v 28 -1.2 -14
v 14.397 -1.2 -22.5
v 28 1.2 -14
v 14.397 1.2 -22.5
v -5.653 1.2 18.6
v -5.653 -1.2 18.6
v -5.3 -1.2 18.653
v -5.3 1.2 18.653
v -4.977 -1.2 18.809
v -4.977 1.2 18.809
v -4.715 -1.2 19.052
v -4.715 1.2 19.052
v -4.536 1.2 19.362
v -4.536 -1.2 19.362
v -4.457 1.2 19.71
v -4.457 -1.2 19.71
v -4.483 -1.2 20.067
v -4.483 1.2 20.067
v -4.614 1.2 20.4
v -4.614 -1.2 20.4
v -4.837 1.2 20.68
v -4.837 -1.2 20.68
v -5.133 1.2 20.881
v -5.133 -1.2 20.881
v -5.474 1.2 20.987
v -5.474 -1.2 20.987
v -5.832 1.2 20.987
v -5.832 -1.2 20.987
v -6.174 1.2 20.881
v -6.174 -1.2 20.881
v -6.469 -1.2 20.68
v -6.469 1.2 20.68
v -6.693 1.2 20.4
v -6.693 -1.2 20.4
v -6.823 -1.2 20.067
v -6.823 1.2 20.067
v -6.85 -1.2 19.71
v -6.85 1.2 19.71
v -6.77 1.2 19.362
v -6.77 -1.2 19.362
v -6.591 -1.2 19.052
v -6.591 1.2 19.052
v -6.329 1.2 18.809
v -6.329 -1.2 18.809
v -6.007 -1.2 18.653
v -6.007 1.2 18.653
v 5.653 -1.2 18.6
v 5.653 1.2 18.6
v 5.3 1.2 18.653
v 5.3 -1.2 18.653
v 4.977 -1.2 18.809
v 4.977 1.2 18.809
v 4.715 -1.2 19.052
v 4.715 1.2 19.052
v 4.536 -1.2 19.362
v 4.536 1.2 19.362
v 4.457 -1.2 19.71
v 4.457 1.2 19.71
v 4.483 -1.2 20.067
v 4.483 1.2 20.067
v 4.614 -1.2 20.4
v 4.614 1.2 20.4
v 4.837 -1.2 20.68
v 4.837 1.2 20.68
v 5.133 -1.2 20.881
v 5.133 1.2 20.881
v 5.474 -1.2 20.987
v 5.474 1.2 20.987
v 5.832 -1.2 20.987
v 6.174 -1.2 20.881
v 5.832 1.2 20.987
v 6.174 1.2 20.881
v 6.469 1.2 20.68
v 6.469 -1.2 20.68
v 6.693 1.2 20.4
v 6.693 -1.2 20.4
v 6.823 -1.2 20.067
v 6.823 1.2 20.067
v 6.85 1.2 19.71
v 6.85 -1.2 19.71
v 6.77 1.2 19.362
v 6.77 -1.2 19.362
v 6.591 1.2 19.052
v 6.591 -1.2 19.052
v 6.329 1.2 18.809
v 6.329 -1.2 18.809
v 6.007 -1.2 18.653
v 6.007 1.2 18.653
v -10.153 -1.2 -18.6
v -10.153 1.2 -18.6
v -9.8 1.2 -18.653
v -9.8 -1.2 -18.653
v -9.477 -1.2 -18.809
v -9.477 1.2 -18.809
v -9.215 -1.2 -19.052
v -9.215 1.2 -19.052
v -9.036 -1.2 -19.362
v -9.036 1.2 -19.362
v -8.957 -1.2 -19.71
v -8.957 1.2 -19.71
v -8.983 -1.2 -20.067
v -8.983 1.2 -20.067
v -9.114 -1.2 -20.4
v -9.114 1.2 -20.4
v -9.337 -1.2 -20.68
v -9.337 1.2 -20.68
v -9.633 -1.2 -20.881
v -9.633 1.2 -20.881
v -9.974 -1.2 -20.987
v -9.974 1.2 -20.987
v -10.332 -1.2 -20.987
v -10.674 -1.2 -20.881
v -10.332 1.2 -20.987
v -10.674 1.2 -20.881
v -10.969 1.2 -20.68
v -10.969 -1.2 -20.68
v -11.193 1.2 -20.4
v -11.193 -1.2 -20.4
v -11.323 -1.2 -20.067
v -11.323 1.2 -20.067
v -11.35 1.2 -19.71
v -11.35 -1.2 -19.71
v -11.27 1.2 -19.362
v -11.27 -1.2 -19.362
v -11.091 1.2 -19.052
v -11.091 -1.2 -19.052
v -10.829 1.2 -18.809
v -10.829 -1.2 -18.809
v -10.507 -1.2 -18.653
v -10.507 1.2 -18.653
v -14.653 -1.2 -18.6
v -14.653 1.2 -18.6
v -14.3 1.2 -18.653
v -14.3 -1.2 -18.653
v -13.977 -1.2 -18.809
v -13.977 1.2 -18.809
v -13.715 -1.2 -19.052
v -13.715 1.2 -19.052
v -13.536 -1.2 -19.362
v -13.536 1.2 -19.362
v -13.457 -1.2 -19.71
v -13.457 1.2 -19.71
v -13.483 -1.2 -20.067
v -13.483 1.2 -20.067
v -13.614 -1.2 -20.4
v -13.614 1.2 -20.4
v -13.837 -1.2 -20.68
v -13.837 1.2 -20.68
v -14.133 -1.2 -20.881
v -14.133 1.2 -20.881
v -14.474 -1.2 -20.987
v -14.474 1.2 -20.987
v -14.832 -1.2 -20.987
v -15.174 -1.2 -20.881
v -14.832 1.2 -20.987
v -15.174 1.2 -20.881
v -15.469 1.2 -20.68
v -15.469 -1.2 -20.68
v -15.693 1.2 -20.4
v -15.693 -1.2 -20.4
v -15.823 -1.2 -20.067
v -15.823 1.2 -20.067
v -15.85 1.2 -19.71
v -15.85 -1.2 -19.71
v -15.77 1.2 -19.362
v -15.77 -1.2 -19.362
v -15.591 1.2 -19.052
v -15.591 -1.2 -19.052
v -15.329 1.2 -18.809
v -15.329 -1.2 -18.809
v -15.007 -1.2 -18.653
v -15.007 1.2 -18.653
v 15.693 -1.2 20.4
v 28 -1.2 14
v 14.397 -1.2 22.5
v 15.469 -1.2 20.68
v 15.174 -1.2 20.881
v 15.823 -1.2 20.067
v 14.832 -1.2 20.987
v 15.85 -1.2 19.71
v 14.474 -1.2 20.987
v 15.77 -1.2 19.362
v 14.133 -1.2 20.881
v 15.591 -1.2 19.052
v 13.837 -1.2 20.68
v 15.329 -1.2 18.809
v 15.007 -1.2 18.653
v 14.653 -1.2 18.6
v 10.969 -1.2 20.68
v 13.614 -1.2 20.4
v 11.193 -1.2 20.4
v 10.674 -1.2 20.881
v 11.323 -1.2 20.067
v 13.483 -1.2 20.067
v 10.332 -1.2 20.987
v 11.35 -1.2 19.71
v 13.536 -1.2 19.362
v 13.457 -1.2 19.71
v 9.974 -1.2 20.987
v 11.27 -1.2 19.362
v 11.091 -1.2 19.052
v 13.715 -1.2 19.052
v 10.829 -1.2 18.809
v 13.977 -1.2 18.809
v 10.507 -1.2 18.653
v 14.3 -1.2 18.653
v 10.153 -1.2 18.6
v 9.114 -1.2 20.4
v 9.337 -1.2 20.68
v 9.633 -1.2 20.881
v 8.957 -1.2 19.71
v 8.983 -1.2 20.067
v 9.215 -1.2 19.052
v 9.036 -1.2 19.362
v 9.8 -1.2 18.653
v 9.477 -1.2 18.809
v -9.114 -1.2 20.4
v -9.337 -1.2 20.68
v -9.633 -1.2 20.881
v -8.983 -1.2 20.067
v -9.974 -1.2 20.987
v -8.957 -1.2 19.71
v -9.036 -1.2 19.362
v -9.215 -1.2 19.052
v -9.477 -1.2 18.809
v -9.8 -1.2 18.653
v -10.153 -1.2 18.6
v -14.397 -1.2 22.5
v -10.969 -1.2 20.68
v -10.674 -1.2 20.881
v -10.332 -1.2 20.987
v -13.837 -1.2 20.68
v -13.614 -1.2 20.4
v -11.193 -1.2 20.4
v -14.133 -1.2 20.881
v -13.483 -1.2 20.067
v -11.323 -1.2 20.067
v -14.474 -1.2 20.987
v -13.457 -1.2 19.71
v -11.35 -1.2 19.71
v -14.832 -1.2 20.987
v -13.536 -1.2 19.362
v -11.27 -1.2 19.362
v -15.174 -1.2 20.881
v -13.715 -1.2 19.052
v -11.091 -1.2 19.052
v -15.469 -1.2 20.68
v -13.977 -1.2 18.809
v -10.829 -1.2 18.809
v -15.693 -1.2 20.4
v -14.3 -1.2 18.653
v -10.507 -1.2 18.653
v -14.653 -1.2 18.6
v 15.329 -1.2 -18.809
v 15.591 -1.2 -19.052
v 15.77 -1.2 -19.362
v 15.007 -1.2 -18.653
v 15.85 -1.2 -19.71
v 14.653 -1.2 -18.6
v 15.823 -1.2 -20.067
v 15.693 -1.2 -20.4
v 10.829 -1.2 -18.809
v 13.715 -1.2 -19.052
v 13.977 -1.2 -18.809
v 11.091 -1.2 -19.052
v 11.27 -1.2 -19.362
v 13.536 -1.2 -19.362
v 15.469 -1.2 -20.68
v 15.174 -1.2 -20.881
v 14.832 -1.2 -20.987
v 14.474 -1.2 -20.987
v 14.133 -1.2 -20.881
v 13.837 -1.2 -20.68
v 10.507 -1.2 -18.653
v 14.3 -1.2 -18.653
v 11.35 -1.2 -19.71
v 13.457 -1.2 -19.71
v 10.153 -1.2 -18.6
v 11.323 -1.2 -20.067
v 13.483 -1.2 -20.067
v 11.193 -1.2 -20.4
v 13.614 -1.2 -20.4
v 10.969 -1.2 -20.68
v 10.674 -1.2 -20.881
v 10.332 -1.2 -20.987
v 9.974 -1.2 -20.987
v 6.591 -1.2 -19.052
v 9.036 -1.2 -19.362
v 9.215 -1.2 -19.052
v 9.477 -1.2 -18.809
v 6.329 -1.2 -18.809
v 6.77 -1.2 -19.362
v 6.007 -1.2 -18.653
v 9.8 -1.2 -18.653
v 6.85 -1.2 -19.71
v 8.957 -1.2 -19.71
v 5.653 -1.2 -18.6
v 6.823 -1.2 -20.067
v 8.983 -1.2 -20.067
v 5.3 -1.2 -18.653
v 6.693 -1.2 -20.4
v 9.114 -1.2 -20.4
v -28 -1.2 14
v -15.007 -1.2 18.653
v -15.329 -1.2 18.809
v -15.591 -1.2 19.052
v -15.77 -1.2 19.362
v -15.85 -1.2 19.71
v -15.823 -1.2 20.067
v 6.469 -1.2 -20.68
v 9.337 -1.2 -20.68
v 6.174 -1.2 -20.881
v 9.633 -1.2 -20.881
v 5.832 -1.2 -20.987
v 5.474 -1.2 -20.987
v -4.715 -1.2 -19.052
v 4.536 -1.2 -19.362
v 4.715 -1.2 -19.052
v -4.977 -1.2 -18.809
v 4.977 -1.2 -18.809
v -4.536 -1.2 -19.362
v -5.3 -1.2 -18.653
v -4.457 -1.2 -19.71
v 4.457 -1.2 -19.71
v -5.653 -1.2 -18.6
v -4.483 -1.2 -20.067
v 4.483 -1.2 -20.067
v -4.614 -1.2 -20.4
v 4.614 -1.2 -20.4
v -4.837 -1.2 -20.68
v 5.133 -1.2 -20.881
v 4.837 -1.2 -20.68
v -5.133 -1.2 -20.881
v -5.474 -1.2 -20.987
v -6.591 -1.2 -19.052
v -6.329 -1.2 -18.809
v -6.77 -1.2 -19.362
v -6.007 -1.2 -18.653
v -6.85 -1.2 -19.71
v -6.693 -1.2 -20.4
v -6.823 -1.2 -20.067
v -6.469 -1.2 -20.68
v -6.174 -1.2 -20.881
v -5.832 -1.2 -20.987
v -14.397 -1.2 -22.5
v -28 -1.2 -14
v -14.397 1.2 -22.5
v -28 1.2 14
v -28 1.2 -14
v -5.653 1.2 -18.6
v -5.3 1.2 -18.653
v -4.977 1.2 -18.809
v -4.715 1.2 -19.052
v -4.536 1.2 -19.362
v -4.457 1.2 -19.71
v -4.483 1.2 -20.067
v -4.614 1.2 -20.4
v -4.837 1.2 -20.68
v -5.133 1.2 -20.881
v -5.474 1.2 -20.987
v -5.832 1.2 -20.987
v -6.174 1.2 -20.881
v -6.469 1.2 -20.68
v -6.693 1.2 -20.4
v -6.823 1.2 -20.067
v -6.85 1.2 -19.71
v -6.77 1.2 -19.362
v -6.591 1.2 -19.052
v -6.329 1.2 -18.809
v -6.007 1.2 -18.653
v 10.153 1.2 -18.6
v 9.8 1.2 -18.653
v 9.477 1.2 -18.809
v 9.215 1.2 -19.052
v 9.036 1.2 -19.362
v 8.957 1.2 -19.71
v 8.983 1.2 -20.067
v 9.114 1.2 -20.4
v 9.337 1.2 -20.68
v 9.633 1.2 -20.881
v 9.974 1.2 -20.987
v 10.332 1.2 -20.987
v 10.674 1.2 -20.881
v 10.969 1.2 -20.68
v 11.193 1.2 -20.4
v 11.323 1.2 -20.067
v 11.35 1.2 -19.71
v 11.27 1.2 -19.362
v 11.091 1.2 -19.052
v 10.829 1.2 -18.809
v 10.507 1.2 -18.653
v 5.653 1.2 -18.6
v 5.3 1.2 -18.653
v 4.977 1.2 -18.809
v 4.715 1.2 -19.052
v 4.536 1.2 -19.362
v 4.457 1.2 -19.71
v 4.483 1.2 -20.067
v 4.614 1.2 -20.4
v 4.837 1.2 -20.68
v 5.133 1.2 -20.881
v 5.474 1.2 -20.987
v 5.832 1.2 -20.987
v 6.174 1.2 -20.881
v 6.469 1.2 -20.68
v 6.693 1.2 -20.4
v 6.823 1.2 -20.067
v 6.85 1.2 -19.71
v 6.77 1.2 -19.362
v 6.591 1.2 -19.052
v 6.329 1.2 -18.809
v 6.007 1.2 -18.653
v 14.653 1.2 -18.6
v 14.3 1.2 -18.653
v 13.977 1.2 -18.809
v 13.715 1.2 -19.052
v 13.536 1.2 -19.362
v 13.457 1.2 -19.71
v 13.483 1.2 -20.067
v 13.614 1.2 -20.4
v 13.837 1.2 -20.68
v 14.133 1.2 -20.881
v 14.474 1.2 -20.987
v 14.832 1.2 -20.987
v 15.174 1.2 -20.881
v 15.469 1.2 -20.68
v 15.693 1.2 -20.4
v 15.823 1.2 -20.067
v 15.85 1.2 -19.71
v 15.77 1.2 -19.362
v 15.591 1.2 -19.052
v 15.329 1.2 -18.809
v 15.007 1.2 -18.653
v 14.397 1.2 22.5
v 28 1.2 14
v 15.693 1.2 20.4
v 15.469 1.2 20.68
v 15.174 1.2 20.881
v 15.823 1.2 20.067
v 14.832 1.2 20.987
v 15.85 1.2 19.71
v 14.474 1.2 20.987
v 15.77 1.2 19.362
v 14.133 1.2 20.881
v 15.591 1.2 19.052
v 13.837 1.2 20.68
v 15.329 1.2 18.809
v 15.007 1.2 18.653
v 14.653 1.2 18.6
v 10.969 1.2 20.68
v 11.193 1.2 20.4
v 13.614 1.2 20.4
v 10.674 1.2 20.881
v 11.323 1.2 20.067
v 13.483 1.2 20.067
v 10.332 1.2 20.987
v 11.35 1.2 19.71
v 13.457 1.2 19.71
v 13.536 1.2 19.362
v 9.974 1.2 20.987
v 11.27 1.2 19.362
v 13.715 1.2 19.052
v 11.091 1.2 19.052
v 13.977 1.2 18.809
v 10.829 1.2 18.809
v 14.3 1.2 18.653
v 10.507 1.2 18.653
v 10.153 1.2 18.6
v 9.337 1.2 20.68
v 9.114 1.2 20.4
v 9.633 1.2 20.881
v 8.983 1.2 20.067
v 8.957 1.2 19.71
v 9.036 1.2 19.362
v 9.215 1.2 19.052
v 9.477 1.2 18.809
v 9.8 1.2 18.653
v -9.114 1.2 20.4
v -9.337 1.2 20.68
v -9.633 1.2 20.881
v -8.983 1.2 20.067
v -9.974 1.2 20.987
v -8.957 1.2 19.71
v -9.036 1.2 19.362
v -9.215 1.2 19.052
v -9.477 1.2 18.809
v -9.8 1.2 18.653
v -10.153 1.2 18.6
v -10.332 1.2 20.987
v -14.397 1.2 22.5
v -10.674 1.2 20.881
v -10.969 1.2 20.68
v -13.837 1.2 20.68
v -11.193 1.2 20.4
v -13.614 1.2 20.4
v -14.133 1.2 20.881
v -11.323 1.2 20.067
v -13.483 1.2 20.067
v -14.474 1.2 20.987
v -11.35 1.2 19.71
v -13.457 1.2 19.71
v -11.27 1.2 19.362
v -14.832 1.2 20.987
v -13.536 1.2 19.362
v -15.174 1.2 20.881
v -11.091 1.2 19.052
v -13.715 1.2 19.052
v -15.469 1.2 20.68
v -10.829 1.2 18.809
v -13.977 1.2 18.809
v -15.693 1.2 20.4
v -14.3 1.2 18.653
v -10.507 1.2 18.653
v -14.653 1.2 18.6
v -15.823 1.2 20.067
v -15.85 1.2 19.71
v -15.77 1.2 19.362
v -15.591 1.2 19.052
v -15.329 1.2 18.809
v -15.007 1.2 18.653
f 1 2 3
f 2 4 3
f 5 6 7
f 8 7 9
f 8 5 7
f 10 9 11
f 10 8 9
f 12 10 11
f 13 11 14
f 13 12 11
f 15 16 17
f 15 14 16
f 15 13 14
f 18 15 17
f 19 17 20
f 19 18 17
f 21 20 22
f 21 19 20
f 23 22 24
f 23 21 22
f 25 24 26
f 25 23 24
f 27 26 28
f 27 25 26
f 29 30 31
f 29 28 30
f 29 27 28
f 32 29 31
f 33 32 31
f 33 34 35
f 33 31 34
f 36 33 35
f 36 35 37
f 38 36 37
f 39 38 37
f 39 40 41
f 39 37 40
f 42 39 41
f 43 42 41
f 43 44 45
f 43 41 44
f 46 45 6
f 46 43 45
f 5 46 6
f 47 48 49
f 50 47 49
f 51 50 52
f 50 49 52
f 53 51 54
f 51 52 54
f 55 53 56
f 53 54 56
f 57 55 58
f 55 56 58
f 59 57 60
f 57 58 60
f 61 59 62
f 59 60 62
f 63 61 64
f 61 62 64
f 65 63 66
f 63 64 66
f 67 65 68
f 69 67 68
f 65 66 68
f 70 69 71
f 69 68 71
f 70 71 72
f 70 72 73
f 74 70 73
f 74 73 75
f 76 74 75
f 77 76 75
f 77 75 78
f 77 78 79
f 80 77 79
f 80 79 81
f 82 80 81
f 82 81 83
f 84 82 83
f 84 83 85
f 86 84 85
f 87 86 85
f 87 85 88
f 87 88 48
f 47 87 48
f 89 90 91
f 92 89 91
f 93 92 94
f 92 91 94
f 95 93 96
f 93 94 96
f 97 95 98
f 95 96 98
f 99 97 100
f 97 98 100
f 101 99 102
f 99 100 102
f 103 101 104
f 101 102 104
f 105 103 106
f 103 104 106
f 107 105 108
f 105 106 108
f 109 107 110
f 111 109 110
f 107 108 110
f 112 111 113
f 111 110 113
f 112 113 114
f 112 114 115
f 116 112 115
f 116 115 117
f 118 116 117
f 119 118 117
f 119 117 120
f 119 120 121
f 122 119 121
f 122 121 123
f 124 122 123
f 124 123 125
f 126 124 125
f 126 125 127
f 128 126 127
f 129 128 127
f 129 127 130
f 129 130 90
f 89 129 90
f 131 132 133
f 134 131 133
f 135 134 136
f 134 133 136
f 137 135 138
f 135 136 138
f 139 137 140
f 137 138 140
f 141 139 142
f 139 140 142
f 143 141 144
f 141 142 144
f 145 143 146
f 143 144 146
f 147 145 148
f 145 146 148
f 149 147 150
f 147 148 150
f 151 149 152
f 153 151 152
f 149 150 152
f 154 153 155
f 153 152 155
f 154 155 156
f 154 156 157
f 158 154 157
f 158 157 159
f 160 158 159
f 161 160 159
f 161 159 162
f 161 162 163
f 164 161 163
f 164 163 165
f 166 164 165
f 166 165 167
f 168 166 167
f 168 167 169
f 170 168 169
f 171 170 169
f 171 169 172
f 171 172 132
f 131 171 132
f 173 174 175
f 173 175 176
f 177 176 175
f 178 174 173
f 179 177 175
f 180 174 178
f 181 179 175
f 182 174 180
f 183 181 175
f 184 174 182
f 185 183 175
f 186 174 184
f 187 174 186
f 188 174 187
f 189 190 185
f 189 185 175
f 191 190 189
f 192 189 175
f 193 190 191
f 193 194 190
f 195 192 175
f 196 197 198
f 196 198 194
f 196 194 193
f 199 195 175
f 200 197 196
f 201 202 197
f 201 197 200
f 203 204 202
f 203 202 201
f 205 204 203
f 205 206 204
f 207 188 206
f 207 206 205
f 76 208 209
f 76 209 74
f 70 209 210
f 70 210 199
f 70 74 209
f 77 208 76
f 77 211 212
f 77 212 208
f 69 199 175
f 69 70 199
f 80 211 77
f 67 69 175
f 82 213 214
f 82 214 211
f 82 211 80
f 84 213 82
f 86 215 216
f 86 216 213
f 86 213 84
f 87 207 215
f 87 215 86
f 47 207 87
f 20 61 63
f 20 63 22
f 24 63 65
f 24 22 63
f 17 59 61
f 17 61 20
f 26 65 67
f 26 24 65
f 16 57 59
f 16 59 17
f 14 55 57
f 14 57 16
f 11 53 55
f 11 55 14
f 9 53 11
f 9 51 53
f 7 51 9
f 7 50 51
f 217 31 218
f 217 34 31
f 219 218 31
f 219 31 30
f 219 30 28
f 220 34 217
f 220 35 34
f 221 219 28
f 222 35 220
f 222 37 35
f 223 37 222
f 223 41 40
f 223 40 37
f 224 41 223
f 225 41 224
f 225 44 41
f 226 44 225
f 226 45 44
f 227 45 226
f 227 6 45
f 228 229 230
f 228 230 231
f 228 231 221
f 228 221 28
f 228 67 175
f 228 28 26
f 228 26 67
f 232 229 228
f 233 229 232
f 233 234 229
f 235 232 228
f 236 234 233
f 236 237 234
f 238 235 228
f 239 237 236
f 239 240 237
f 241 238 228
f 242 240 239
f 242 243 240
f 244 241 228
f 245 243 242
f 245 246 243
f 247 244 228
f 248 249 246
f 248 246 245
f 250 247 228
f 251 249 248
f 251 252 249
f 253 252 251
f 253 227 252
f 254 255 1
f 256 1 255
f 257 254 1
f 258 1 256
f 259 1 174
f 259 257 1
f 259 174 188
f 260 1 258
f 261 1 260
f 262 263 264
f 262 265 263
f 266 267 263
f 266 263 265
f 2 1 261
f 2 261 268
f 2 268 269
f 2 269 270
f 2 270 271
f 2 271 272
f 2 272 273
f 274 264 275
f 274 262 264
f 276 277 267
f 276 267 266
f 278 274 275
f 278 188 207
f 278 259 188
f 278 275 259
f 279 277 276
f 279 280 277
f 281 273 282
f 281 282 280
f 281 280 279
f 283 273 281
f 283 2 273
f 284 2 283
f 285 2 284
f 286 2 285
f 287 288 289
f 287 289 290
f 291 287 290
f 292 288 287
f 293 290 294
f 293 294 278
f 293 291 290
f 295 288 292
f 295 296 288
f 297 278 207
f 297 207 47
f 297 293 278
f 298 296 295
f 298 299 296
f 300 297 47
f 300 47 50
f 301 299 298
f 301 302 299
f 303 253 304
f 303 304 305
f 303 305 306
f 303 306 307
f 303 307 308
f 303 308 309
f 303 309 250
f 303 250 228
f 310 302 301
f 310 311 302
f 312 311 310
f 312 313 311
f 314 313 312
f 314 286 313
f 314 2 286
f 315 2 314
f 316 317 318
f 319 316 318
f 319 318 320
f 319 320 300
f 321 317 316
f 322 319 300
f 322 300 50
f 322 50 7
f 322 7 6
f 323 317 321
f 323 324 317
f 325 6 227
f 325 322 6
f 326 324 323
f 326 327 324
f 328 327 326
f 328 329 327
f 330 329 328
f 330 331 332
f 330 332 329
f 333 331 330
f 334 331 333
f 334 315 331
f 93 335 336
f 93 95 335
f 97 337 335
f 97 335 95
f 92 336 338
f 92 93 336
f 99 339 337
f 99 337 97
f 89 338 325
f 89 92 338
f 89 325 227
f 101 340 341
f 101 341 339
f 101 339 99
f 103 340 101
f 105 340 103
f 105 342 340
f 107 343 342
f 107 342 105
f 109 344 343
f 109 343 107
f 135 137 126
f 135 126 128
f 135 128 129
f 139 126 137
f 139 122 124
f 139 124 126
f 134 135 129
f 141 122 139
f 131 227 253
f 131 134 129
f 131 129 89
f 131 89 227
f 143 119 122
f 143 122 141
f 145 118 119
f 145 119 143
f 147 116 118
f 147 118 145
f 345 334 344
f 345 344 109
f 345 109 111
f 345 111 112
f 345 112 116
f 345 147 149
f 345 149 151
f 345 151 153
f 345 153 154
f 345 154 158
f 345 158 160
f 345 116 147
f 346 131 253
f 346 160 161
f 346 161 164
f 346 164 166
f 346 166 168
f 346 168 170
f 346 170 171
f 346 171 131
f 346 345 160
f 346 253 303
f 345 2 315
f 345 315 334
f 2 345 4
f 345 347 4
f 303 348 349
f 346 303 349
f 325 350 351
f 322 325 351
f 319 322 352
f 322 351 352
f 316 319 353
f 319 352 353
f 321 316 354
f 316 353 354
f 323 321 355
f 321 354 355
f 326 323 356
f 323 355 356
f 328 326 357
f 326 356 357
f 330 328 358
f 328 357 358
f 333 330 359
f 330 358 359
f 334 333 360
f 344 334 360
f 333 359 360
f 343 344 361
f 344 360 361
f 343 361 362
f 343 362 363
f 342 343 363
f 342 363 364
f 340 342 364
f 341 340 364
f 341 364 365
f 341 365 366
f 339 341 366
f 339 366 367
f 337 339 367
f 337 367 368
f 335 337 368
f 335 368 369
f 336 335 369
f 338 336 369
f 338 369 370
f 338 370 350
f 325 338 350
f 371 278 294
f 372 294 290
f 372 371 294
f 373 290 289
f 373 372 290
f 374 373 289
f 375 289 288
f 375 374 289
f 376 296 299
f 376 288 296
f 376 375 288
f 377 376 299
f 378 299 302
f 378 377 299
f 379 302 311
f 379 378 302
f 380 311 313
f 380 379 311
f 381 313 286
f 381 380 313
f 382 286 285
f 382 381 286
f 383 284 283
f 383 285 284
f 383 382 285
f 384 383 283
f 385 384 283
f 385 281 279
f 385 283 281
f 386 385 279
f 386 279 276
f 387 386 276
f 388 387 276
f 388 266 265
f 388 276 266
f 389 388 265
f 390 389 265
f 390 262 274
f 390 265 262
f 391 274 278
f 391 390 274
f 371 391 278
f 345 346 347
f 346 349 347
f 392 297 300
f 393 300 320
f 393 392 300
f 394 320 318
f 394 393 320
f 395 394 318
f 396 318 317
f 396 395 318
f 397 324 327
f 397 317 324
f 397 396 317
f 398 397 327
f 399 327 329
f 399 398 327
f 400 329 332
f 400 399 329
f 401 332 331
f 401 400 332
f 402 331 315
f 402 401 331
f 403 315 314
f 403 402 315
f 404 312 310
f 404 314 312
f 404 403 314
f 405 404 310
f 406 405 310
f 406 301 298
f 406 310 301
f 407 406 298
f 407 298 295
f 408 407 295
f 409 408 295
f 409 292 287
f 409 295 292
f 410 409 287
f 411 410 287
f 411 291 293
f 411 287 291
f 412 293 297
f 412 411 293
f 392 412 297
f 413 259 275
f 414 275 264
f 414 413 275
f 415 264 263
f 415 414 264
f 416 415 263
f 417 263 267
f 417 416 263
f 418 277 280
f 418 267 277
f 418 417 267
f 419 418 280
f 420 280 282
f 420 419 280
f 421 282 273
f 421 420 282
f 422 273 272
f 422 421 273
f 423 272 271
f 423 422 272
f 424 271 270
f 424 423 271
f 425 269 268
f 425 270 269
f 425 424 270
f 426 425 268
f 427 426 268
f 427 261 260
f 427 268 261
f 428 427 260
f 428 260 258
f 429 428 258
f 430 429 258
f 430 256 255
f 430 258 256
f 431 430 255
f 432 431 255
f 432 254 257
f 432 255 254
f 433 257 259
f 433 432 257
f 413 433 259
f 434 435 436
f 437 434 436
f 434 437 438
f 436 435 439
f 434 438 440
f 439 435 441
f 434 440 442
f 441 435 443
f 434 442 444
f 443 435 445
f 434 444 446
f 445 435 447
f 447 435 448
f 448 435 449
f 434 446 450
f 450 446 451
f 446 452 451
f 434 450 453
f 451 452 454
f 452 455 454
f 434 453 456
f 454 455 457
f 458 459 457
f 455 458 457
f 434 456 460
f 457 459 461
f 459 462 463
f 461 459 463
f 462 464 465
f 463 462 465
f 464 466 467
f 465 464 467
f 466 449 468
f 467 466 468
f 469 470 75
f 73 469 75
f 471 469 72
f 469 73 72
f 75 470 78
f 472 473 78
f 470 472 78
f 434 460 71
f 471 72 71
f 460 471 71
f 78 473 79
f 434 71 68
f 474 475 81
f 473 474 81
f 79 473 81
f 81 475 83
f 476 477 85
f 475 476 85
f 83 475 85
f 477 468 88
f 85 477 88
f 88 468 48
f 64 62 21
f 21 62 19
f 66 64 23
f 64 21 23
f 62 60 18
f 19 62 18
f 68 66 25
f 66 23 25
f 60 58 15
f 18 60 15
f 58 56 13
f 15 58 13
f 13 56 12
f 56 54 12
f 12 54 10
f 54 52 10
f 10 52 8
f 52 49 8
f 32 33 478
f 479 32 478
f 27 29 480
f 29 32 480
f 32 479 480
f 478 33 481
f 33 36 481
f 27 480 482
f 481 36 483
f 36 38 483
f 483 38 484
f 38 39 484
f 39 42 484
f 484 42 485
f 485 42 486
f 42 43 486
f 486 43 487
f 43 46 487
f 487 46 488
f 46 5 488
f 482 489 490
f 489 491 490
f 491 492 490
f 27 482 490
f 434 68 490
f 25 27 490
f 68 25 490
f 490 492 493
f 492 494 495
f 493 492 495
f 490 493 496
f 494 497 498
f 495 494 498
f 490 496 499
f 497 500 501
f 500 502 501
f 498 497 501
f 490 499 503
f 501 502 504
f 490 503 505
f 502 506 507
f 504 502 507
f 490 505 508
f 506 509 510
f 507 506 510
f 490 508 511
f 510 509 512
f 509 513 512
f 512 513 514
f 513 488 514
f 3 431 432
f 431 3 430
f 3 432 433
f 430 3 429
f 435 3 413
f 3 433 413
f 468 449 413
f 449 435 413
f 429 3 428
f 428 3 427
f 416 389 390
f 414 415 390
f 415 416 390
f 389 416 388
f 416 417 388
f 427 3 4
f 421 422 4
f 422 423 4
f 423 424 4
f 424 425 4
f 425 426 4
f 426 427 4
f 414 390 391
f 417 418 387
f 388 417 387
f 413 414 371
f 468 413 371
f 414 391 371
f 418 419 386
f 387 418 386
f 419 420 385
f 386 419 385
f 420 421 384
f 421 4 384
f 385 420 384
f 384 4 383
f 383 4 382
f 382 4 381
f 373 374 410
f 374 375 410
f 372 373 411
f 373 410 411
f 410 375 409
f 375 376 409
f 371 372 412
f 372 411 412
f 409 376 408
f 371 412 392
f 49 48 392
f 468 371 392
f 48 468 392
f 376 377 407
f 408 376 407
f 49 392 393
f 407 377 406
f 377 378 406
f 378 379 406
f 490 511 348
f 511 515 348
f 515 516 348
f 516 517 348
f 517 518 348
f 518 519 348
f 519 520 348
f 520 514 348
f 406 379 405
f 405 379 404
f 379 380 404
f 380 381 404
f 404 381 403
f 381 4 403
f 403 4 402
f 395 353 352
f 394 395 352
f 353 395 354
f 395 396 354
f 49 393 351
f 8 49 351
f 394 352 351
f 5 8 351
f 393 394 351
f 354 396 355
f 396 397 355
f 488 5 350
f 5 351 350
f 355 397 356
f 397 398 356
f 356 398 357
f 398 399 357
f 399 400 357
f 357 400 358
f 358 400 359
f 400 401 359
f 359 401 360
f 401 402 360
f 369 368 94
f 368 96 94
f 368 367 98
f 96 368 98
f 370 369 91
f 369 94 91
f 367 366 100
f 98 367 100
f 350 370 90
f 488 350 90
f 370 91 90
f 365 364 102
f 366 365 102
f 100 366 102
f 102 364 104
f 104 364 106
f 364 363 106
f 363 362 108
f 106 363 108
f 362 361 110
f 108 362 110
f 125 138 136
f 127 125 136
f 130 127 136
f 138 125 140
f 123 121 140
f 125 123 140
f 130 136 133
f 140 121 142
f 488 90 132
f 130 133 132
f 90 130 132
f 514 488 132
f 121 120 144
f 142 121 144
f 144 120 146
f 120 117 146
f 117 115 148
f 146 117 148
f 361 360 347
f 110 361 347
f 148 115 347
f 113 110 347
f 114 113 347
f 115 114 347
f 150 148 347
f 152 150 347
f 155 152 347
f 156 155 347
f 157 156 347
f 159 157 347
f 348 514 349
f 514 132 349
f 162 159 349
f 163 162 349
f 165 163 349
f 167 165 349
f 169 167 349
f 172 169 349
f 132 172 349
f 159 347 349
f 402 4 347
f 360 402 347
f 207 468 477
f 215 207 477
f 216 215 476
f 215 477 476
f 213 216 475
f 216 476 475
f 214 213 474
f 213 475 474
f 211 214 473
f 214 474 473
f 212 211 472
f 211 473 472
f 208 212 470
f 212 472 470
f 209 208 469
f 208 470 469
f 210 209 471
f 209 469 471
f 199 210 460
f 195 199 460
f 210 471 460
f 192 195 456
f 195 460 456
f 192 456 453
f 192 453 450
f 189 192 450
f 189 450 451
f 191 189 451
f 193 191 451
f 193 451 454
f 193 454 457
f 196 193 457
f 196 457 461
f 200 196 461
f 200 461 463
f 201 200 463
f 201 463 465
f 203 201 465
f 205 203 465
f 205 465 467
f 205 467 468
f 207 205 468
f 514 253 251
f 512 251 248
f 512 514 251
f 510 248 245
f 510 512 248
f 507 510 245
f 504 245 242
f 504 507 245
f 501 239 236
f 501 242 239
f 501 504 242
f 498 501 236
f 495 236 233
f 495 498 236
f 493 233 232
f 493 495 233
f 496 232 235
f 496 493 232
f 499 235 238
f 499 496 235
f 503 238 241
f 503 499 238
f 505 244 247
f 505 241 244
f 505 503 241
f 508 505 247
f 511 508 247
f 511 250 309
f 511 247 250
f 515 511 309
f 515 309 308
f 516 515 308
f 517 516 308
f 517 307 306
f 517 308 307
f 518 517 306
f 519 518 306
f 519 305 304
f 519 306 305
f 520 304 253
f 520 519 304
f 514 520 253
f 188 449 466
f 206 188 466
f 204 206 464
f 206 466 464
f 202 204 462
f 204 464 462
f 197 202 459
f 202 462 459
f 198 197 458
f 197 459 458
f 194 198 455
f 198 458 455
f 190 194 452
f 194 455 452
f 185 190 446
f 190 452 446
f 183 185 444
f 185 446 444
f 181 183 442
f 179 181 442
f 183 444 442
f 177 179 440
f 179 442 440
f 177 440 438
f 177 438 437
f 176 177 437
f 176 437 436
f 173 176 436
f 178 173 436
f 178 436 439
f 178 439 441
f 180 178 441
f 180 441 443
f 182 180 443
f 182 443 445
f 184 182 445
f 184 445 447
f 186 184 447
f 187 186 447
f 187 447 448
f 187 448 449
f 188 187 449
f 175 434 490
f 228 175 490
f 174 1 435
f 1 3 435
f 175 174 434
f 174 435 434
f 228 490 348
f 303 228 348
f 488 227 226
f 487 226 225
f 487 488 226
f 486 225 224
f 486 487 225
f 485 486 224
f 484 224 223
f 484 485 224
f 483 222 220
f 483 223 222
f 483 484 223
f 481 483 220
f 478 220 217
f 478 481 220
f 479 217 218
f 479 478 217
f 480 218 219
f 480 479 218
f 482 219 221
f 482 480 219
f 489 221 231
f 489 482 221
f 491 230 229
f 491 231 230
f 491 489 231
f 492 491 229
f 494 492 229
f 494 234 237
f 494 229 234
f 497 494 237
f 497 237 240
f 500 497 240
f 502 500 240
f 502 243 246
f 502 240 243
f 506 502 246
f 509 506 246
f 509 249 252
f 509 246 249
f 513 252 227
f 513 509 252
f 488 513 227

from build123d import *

# Parameters (mm, degrees)
BOSS_EXTRUDE1_DEPTH     = 1.2
SKETCH3_R               = 1.2
CUT_EXTRUDE1_DEPTH      = 37.000138889
MIRROR2_COPY_1_SKETCH_R = 1.2
MIRROR2_COPY_1_DEPTH    = 37.000138889


with BuildPart() as part:
    # Sketch2 → Boss-Extrude1 (new, symmetric)
    with BuildSketch(Plane(origin=(0, 0, 0), x_dir=(1, 0, 0), z_dir=(0, 1, 0))):
        Polygon((-28, -14), (-28, 14), (-14.397156503, 22.5), (14.397156503, 22.5), (28, 14), (28, -14), (14.397156503, -22.5), (-14.397156503, -22.5), align=None)
    extrude(amount=BOSS_EXTRUDE1_DEPTH, both=True)

    # Sketch3 → Cut-Extrude1 (cut, through all)
    with BuildSketch(Plane(origin=(0, 1.2, 0), x_dir=(1, 0, 0), z_dir=(0, 1, 0))):
        with Locations(Location((-14.653288443, 19.8, 0), (0, 0, 270))):
            Circle(SKETCH3_R)
        with Locations(Location((-10.153288443, 19.8, 0), (0, 0, 270))):
            Circle(SKETCH3_R)
        with Locations(Location((-5.653288443, 19.8, 0), (0, 0, 270))):
            Circle(SKETCH3_R)
    cut_extrude1 = extrude(amount=-CUT_EXTRUDE1_DEPTH, mode=Mode.SUBTRACT)

    # Mirror1: Cut-Extrude1 across plane
    add(cut_extrude1.mirror(Plane(origin=(0, 0, 0), x_dir=(0, 0, 1), z_dir=(1, 0, 0))), mode=Mode.SUBTRACT)

    # Mirror2: Cut-Extrude1 across plane
    add(cut_extrude1.mirror(Plane.XY), mode=Mode.SUBTRACT)

    # Mirror2 copy 1 sketch → Mirror2 copy 1 (cut, through all)
    with BuildSketch(Plane(origin=(0, 1.2, 0), x_dir=(-1, 0, 0), z_dir=(0, 1, 0))):
        with Locations(Location((-14.653288443, 19.8, 0), (0, 0, 270))):
            Circle(MIRROR2_COPY_1_SKETCH_R)
        with Locations(Location((-10.153288443, 19.8, 0), (0, 0, 270))):
            Circle(MIRROR2_COPY_1_SKETCH_R)
        with Locations(Location((-5.653288443, 19.8, 0), (0, 0, 270))):
            Circle(MIRROR2_COPY_1_SKETCH_R)
    extrude(amount=-MIRROR2_COPY_1_DEPTH, mode=Mode.SUBTRACT)


solid = part.part
